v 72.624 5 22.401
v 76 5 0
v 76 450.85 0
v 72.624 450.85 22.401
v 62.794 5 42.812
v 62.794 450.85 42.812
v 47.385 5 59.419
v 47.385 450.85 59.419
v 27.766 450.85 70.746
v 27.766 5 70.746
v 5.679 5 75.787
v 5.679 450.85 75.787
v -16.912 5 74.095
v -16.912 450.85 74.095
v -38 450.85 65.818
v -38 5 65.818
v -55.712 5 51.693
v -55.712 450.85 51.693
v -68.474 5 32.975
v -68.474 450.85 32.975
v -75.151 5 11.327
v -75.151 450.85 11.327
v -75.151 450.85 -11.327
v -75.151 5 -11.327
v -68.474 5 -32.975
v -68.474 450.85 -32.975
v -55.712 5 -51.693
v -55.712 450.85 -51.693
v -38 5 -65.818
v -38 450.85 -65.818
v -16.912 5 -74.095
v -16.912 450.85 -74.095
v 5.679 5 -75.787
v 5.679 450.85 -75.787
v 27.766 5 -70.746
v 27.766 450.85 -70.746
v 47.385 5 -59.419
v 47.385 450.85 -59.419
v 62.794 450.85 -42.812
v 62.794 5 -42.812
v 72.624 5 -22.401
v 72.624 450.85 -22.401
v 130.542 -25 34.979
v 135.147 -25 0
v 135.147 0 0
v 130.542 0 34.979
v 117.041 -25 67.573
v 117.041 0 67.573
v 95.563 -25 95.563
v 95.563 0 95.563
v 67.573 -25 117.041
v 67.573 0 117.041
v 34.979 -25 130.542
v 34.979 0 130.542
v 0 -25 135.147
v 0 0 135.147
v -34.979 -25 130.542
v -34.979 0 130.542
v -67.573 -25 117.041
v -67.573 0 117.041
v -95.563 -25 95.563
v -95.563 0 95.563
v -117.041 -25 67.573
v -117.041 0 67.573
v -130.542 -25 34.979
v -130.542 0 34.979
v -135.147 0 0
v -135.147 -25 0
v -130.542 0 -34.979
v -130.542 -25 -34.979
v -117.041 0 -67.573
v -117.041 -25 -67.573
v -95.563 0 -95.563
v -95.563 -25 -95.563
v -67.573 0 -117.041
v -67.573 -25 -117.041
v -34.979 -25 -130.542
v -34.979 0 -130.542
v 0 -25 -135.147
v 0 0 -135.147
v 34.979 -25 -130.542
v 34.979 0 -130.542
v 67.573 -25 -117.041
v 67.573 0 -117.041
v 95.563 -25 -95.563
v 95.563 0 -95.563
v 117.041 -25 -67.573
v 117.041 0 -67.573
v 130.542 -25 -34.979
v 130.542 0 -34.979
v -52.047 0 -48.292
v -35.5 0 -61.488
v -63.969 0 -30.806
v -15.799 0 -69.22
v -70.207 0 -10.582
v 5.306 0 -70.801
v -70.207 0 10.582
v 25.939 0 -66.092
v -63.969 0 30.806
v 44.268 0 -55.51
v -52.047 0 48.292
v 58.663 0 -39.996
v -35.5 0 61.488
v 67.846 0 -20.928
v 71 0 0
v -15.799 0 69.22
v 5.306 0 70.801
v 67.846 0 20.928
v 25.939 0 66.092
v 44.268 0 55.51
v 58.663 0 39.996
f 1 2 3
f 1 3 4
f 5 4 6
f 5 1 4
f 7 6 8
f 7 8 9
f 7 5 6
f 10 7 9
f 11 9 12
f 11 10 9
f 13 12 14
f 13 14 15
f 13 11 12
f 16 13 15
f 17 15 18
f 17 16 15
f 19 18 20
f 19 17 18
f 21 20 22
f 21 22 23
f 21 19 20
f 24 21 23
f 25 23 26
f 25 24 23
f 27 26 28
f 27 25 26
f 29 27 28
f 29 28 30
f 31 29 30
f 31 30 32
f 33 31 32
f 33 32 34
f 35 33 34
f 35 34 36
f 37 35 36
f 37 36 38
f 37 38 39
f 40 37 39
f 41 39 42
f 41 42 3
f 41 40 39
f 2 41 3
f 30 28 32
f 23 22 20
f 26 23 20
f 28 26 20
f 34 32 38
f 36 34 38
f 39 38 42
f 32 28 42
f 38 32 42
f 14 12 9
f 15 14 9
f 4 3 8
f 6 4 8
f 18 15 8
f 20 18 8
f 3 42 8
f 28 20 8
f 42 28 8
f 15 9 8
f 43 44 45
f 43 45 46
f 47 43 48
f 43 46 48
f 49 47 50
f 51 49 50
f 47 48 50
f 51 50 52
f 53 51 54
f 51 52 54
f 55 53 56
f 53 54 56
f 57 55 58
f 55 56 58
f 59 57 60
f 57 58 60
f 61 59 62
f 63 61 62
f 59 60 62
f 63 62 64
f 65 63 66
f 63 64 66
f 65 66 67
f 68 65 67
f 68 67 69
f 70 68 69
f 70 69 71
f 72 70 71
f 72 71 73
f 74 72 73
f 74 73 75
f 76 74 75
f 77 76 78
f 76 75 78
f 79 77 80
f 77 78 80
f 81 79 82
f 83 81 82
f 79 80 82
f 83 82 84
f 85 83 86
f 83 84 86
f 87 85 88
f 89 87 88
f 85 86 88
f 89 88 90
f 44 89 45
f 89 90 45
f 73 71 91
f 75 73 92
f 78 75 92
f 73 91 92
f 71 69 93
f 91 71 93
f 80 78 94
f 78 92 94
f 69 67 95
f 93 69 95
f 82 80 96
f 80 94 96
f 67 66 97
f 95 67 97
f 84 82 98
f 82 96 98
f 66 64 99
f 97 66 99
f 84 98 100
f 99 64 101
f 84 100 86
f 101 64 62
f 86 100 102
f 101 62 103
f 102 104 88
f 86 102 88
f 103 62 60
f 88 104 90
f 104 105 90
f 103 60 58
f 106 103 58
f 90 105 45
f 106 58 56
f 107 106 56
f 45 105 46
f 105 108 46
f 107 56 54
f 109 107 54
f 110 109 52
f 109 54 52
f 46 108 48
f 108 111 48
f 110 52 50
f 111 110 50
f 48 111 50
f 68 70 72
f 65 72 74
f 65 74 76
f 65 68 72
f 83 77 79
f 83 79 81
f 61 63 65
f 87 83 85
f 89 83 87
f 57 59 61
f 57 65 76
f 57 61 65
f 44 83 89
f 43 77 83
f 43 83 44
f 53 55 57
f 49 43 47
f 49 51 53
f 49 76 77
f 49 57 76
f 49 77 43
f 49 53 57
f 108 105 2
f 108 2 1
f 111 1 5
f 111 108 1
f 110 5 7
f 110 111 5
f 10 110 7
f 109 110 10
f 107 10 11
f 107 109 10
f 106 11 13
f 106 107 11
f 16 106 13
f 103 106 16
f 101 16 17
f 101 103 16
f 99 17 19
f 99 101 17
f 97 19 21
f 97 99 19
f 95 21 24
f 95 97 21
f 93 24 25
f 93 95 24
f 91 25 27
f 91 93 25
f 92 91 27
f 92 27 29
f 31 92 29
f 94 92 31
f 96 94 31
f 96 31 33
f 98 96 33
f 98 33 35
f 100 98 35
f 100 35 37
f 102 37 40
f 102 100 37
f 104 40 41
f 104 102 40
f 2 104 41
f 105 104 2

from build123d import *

# Parameters (mm, degrees)
F0_R     = 76
F1_DEPTH = 450.85
F2_SIZE  = 5
F3_R     = 135.146802
F4_DEPTH = 25


with BuildPart() as f1:
    # F0 (on Front) → F1 (new body)
    with BuildSketch(Plane.XZ):
        Circle(F0_R)
    extrude(amount=-F1_DEPTH)

    # F2
    f2_edges = [f1.edges().sort_by_distance(p)[0] for p in [
        (-76, 0, 0),
    ]]
    chamfer(f2_edges, length=F2_SIZE)

    # F3 (on Front) → F4 (join)
    with BuildSketch(Plane.XZ):
        Circle(F3_R)
    extrude(amount=F4_DEPTH)


solid = f1.part
